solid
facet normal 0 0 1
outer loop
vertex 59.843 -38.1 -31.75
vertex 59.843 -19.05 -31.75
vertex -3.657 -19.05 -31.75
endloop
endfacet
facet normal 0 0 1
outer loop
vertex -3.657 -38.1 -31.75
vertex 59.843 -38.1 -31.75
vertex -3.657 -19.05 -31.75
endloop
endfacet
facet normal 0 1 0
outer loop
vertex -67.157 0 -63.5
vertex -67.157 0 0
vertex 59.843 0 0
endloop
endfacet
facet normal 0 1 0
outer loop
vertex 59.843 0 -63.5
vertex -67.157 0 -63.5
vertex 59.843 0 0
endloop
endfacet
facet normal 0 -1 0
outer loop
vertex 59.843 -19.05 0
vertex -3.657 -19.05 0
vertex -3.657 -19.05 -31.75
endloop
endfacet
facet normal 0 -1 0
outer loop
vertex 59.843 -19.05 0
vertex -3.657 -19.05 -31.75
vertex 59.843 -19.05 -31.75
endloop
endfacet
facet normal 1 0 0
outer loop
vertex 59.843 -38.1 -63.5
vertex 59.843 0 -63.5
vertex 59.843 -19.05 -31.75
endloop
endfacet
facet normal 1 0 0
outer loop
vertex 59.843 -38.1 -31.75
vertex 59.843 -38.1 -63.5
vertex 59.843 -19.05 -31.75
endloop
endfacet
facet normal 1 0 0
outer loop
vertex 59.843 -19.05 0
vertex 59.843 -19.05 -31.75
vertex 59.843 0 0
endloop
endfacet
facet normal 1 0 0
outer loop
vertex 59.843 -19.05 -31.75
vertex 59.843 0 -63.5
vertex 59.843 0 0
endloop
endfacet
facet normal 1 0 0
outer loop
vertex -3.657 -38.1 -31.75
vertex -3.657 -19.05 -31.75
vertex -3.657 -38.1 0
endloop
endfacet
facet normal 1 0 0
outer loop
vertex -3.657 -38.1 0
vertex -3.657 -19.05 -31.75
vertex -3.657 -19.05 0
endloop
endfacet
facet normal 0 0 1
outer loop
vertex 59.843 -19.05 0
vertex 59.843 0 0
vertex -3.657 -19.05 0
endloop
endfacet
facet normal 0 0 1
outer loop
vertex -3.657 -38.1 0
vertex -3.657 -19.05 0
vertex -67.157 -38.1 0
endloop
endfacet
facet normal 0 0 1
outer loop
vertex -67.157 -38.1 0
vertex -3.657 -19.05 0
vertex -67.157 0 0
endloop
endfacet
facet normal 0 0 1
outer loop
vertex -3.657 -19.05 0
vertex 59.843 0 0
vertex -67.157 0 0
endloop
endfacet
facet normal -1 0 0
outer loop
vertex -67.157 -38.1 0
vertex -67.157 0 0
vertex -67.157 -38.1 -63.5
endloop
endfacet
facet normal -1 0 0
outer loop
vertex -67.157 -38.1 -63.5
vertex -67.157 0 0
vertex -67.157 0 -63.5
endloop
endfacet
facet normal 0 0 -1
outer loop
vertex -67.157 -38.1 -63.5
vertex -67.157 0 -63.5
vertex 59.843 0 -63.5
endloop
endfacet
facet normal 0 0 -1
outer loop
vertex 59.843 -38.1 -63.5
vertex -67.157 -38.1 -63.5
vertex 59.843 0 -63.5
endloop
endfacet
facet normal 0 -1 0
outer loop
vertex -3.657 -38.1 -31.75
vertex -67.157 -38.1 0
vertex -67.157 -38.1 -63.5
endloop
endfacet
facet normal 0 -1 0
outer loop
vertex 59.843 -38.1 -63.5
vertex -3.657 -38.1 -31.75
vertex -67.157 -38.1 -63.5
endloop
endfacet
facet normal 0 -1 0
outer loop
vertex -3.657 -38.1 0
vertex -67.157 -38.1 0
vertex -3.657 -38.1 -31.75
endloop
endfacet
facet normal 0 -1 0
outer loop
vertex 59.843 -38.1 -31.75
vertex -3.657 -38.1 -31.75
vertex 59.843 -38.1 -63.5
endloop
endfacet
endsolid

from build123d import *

# Parameters (mm, degrees)
F1_DEPTH = 38.1
F0_W     = 63.5
F0_H     = 31.75
F2_DEPTH = 19.05


with BuildPart() as f1:
    # F0 (on Front) → F1 (new body)
    with BuildSketch(Plane.XZ):
        Polygon((-67.157373, 0), (-67.157373, -63.5), (59.842627, -63.5), (59.842627, -31.75), (-3.657373, -31.75), (-3.657373, 0), align=None)
    extrude(amount=F1_DEPTH)

    # F0 (on Front) → F2 (join)
    with BuildSketch(Plane.XZ):
        Polygon((-67.157373, 0), (-67.157373, -63.5), (59.842627, -63.5), (59.842627, -31.75), (-3.657373, -31.75), (-3.657373, 0), align=None)
        with Locations((28.092627, -15.875)):
            Rectangle(F0_W, F0_H)
    extrude(amount=F2_DEPTH)


solid = f1.part
